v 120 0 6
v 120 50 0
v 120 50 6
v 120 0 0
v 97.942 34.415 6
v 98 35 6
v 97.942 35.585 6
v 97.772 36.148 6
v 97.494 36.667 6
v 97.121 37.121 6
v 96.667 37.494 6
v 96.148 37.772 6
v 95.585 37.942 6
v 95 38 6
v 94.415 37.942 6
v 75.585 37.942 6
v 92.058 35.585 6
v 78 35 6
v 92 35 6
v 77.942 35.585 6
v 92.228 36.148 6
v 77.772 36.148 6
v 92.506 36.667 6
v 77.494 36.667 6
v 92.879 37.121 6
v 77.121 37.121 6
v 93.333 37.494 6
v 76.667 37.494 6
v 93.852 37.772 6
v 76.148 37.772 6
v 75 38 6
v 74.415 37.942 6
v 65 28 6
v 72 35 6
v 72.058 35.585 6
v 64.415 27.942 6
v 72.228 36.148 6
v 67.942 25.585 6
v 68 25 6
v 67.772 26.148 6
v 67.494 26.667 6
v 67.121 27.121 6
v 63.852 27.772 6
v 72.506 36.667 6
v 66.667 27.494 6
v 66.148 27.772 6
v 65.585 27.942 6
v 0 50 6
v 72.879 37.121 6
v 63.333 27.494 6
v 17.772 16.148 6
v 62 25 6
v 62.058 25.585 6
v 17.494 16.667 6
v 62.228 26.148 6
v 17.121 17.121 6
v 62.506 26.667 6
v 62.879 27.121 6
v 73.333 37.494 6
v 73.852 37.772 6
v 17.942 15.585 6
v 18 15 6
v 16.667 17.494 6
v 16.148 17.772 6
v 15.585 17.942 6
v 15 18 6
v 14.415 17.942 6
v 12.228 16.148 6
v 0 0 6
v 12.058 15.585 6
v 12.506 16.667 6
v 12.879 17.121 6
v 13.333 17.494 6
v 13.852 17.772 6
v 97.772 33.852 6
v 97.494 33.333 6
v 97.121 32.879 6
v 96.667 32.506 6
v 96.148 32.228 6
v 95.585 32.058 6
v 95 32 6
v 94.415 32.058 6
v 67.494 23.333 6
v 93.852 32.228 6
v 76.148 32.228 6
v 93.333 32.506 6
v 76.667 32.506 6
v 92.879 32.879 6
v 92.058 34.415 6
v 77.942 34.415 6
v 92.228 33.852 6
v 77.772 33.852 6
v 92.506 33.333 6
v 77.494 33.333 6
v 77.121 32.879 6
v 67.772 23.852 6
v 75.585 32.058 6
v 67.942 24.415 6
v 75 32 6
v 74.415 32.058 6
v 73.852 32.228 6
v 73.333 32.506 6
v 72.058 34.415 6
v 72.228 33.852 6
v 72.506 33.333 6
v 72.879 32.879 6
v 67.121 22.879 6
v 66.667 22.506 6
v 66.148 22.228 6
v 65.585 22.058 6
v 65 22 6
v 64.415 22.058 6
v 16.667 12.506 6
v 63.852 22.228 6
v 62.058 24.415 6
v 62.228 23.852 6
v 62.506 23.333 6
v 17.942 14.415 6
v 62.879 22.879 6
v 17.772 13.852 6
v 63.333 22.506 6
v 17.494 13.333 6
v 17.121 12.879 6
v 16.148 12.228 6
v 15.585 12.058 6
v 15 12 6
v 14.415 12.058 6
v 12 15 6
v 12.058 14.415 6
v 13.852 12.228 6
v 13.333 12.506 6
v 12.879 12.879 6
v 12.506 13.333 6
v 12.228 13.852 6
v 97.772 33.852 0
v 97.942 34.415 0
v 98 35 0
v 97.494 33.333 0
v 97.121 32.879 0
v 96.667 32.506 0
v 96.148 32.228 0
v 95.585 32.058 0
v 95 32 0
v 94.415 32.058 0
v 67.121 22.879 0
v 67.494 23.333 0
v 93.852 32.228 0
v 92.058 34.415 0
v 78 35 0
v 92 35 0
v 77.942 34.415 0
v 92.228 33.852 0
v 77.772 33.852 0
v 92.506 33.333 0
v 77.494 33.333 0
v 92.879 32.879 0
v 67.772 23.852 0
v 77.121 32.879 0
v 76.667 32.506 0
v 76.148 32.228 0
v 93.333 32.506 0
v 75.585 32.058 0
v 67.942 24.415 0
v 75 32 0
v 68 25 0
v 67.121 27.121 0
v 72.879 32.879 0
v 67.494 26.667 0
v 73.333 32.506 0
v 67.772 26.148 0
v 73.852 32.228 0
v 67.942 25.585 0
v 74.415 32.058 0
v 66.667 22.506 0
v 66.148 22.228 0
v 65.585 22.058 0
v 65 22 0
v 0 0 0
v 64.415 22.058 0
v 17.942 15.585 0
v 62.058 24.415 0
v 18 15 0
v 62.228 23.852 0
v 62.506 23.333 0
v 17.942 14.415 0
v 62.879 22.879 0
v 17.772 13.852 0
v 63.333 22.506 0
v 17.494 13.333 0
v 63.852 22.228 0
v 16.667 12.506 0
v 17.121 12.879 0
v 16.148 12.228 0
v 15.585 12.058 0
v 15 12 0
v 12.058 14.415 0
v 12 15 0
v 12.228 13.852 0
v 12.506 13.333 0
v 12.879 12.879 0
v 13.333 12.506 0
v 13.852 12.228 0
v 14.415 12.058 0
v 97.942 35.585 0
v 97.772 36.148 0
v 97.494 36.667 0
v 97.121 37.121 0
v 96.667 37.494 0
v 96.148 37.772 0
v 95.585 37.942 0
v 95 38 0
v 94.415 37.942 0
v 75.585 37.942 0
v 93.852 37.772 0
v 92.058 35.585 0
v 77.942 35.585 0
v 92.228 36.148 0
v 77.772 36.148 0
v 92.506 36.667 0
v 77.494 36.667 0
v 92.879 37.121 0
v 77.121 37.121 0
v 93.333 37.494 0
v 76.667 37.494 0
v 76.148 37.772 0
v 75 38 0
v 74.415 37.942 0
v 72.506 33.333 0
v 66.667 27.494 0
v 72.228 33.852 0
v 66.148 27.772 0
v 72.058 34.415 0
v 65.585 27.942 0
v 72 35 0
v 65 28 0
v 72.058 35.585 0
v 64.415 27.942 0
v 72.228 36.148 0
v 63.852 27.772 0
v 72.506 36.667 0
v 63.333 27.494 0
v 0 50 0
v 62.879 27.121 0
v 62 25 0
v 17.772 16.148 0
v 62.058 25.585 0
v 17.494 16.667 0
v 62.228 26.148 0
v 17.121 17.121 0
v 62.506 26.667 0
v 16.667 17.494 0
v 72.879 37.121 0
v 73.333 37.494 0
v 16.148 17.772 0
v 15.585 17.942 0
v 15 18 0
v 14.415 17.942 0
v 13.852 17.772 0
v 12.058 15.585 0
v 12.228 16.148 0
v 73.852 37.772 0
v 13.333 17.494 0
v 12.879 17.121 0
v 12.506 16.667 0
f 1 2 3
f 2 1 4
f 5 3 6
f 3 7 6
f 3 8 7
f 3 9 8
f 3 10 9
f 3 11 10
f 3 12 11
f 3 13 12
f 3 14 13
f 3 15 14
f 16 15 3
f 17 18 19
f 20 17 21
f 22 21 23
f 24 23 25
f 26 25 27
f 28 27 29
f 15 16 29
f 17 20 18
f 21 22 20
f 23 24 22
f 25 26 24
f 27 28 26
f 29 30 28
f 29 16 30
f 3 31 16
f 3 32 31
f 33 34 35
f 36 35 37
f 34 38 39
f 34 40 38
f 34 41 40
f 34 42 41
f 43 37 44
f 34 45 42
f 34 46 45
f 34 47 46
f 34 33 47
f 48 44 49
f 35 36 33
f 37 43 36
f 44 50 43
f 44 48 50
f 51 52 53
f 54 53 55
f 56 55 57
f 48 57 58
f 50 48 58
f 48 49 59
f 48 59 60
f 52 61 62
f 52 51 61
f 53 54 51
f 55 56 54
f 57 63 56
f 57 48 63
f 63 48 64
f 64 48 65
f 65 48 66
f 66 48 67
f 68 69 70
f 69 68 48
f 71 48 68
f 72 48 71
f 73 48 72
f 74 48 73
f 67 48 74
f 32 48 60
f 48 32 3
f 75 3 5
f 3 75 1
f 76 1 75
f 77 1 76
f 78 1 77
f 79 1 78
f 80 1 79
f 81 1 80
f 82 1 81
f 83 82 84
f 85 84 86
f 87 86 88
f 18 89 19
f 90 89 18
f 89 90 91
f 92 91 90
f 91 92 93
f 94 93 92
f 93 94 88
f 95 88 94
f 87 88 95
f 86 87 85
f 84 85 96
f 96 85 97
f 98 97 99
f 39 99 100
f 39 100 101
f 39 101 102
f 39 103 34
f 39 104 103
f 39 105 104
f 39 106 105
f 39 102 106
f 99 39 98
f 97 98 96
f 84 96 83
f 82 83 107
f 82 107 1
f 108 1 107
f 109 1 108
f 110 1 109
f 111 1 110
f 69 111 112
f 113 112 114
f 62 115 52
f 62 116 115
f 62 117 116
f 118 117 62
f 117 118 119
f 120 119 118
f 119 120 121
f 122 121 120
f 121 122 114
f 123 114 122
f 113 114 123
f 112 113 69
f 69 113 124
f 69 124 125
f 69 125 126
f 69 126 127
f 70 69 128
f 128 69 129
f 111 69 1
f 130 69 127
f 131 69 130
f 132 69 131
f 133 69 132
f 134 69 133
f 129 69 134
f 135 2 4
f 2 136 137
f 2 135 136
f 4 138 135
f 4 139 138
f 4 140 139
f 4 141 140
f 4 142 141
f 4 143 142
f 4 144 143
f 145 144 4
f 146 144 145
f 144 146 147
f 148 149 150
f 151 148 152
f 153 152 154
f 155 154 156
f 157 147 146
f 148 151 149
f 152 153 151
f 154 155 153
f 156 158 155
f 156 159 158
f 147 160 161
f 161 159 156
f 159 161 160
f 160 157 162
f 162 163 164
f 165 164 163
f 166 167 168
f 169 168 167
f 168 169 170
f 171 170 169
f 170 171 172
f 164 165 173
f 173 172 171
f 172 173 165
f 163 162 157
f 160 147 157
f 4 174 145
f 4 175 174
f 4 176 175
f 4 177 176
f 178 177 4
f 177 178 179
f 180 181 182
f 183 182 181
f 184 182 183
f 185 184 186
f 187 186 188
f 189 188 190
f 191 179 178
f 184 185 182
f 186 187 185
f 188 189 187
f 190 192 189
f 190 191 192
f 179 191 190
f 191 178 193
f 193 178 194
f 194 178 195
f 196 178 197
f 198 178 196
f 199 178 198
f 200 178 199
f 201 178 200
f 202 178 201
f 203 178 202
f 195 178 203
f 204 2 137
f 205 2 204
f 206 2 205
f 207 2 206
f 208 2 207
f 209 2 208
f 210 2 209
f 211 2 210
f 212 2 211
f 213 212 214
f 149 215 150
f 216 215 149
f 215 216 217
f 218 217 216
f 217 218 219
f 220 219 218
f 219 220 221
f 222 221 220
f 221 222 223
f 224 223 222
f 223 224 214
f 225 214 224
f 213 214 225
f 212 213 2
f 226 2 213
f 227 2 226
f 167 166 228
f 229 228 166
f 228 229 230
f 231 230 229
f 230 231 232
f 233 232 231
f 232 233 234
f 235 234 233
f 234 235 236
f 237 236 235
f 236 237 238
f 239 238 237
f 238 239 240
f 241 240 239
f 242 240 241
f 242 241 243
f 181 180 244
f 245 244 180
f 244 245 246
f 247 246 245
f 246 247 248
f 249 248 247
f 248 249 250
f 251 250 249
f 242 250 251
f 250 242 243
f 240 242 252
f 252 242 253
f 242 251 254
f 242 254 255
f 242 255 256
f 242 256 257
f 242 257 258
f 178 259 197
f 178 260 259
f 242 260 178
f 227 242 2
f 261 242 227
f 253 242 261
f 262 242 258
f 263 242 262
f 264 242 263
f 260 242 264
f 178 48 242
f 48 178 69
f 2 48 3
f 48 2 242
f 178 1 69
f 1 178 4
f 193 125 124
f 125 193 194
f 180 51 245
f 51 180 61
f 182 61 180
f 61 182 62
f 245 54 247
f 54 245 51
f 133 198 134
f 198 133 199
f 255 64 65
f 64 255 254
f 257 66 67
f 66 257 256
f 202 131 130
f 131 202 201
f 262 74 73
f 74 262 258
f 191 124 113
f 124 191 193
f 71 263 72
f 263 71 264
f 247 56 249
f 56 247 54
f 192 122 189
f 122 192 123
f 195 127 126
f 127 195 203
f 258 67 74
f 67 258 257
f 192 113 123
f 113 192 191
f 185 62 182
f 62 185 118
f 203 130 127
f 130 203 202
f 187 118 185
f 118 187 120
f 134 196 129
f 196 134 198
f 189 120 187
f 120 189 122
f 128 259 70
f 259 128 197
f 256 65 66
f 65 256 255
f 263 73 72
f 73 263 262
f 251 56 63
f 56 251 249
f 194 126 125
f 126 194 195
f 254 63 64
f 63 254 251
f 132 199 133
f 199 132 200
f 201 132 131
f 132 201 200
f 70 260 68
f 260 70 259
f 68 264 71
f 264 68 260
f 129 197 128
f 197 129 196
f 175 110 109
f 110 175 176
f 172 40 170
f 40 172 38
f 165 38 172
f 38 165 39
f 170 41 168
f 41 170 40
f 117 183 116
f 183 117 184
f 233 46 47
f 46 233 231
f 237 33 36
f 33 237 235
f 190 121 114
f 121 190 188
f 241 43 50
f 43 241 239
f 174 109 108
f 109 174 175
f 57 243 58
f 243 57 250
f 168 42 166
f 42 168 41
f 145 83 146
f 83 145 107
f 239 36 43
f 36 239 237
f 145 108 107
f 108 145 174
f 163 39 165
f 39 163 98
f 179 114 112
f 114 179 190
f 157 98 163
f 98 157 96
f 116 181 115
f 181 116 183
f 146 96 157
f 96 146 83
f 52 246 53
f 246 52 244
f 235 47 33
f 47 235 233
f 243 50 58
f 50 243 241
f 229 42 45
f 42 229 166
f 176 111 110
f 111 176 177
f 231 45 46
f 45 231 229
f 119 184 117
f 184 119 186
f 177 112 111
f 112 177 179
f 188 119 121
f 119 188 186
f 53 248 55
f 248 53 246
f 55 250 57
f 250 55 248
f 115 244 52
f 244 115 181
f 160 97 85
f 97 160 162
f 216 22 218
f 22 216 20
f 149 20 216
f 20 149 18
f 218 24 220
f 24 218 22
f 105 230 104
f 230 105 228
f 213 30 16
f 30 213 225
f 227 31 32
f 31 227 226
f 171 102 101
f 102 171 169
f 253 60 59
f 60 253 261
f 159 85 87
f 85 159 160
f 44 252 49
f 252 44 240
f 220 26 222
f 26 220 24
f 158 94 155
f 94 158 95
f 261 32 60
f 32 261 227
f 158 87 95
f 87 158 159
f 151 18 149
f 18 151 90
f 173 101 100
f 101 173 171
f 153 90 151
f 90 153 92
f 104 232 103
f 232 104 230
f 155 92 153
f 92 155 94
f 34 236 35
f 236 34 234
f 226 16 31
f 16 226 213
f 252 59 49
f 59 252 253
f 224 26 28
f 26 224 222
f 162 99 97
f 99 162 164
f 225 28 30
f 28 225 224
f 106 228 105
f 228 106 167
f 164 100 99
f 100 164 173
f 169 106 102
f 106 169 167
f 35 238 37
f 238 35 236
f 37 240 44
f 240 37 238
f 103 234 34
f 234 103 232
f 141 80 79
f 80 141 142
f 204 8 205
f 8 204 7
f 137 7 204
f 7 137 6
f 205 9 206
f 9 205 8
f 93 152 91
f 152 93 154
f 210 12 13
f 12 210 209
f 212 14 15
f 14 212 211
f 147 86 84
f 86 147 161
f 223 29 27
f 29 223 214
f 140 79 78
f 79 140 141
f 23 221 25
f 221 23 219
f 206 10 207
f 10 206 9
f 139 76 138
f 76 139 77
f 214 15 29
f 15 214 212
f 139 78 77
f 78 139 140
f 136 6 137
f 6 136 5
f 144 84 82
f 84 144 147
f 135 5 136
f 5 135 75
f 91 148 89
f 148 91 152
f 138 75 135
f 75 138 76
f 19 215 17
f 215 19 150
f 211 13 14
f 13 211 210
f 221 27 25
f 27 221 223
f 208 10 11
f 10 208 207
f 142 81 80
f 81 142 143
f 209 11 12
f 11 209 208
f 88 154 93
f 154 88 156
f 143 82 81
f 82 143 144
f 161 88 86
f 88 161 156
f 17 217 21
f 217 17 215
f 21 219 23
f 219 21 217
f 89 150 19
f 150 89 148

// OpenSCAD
$fn = 32;

// ----------------------------------------------------------------------
// Hole field: plate with holes at given coordinates
// ----------------------------------------------------------------------

// --- parameters (mm) ---
plate_l = 120;            // plate length, X
plate_w = 50;             // plate width, Y
plate_t = 6;              // plate thickness, Z
hole_d = 6;               // hole diameter

difference() {
  cube([plate_l, plate_w, plate_t]);
  translate([15, 15, -1]) cylinder(h = plate_t + 2, d = hole_d);
  translate([65, 25, -1]) cylinder(h = plate_t + 2, d = hole_d);
  translate([75, 35, -1]) cylinder(h = plate_t + 2, d = hole_d);
  translate([95, 35, -1]) cylinder(h = plate_t + 2, d = hole_d);
}
